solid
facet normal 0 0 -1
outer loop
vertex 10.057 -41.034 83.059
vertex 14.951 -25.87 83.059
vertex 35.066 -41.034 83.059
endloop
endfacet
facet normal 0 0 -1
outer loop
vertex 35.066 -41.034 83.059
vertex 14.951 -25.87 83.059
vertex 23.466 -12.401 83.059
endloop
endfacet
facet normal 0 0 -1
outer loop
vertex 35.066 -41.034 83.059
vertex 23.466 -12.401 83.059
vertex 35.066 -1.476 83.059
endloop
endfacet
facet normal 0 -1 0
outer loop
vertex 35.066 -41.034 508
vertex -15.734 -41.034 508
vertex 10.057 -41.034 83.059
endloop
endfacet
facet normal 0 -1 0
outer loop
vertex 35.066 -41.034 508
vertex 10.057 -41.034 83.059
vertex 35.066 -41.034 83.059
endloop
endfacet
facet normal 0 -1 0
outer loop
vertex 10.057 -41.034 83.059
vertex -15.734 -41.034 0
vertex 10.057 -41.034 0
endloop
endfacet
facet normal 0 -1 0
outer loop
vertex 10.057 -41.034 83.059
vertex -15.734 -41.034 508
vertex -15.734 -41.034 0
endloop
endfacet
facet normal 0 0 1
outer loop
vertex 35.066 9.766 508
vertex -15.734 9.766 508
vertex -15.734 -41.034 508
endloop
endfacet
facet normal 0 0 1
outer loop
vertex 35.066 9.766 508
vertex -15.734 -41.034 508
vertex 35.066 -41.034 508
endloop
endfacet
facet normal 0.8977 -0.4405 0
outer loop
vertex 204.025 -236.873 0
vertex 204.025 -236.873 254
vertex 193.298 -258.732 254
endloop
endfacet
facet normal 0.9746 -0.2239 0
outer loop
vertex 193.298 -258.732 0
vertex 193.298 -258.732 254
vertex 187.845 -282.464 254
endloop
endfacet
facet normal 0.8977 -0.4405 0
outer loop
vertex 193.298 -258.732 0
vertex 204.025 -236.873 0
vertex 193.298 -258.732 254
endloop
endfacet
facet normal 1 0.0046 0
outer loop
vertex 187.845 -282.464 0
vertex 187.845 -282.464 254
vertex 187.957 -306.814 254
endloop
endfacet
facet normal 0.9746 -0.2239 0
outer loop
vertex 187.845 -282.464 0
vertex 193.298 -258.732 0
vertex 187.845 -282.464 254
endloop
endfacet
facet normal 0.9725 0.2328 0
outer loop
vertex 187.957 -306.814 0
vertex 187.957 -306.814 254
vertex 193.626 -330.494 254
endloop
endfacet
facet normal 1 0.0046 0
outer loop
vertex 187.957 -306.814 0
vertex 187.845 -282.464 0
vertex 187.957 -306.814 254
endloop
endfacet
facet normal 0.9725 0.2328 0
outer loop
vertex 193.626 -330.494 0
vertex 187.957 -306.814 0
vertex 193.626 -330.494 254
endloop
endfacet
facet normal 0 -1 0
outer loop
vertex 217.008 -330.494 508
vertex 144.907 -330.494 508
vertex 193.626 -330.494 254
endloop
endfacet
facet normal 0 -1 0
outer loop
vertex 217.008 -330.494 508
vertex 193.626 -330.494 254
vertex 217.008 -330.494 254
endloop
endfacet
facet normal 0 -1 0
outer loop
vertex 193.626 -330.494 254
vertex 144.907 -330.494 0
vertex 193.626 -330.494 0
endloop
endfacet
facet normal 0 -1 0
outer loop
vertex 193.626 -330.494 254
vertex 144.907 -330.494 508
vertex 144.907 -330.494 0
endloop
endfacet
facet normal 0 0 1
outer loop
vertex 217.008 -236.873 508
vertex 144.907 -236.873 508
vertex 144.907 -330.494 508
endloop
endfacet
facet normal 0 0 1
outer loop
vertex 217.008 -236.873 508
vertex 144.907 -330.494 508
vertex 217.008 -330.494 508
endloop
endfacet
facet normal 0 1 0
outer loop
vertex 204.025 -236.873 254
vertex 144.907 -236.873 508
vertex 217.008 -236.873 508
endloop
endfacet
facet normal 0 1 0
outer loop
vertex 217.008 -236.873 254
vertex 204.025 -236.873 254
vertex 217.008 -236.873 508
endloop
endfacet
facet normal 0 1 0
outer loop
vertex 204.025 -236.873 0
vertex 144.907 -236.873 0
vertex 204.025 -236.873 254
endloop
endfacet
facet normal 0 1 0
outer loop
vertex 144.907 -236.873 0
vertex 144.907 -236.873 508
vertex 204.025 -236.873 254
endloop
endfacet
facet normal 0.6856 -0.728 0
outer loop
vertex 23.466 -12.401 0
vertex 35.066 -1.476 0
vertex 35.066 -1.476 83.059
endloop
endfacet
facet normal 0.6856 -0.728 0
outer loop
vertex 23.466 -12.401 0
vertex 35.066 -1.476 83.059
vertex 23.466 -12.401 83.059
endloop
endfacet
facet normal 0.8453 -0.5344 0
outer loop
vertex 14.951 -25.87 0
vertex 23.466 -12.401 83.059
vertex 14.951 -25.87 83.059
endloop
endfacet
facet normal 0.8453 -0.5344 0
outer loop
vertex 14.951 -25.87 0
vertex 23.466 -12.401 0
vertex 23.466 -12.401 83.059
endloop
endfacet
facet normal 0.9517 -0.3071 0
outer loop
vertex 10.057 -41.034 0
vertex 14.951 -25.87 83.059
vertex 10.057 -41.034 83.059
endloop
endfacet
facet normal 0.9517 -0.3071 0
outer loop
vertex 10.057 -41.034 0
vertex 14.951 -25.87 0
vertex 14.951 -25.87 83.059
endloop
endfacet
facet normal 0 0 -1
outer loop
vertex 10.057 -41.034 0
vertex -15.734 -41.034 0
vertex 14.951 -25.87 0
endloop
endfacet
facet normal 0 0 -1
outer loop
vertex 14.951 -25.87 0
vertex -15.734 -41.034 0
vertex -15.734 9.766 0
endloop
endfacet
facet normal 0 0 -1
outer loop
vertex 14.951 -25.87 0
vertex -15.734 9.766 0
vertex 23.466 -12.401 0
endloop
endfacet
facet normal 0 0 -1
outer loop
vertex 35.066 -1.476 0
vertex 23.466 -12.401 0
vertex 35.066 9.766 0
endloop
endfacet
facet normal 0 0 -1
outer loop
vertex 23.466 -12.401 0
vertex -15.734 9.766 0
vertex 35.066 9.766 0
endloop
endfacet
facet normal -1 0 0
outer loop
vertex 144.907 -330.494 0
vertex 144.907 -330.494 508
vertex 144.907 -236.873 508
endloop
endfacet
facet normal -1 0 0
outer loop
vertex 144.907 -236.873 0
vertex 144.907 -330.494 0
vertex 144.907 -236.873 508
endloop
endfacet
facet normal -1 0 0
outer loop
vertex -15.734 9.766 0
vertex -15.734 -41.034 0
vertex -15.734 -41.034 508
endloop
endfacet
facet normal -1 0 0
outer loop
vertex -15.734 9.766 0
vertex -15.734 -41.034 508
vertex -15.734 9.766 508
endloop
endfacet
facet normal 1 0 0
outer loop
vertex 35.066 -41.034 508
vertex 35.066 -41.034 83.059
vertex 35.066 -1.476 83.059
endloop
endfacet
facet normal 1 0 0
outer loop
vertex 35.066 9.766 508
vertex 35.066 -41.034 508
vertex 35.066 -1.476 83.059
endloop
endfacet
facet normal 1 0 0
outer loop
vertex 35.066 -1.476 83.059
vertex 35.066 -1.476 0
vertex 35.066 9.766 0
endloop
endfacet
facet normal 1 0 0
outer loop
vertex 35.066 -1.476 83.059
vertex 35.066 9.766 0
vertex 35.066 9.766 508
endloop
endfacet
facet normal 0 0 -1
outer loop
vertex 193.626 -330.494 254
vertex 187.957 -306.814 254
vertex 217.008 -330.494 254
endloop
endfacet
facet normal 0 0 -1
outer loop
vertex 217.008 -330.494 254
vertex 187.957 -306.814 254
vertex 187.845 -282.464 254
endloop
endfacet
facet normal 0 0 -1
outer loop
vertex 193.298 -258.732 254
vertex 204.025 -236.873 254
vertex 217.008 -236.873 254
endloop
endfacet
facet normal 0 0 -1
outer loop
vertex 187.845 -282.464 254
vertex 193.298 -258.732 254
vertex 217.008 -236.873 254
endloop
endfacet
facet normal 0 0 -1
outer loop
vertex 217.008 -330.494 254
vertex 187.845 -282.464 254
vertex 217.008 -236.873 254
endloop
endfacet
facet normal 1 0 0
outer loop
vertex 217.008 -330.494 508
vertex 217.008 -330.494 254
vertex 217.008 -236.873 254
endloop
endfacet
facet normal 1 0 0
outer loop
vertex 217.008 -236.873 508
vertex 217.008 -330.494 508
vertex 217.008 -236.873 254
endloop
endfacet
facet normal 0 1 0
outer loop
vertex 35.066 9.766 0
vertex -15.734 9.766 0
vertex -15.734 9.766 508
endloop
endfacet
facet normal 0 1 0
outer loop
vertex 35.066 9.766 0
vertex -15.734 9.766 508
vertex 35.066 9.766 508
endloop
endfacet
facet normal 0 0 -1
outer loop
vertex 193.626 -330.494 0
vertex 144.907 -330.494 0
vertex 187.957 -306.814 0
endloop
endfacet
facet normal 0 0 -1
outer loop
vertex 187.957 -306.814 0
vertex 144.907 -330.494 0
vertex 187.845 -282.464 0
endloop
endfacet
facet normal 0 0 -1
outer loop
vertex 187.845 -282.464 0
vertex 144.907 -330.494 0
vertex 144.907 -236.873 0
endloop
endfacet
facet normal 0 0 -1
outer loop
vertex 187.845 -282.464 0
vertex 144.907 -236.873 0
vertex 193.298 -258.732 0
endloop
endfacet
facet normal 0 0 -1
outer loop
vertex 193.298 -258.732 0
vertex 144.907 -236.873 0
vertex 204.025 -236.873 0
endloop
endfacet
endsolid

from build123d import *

# Parameters (mm, degrees)
F1_W     = 50.8
F1_H     = 50.8
F2_DEPTH = 508
F3_R     = 63.5
F4_DEPTH = 83.05869
F5_W     = 72.1005052328
F5_H     = 93.6214327812
F6_DEPTH = 508
F7_R     = 105.920672741
F8_DEPTH = 254


# Not quite as in the source:
# - a variable given as a bare number and used for a length is read in inches; the dataset says mm whatever the document's units were


with BuildPart() as f2:
    # F1 (on Top) → F2 (new body)
    with BuildSketch(Plane.XY):
        with Locations((9.6655465204, -15.6340606053)):
            Rectangle(F1_W, F1_H)
    extrude(amount=F2_DEPTH)

    # F3 (on Top) → F4 (cut)
    with BuildSketch(Plane.XY):
        with Locations((72.4574252963, -52.7999475598)):
            Circle(F3_R)
    extrude(amount=F4_DEPTH, mode=Mode.SUBTRACT)


with BuildPart() as f6:
    # F5 (on Top) → F6 (new body)
    with BuildSketch(Plane.XY):
        with Locations((180.9576675296, -283.6835384369)):
            Rectangle(F5_W, F5_H)
    extrude(amount=F6_DEPTH)

    # F7 (on Top) → F8 (cut)
    with BuildSketch(Plane.XY):
        with Locations((293.1186258793, -294.1574752331)):
            Circle(F7_R)
    extrude(amount=F8_DEPTH, mode=Mode.SUBTRACT)


solid = Compound([f2.part, f6.part])
